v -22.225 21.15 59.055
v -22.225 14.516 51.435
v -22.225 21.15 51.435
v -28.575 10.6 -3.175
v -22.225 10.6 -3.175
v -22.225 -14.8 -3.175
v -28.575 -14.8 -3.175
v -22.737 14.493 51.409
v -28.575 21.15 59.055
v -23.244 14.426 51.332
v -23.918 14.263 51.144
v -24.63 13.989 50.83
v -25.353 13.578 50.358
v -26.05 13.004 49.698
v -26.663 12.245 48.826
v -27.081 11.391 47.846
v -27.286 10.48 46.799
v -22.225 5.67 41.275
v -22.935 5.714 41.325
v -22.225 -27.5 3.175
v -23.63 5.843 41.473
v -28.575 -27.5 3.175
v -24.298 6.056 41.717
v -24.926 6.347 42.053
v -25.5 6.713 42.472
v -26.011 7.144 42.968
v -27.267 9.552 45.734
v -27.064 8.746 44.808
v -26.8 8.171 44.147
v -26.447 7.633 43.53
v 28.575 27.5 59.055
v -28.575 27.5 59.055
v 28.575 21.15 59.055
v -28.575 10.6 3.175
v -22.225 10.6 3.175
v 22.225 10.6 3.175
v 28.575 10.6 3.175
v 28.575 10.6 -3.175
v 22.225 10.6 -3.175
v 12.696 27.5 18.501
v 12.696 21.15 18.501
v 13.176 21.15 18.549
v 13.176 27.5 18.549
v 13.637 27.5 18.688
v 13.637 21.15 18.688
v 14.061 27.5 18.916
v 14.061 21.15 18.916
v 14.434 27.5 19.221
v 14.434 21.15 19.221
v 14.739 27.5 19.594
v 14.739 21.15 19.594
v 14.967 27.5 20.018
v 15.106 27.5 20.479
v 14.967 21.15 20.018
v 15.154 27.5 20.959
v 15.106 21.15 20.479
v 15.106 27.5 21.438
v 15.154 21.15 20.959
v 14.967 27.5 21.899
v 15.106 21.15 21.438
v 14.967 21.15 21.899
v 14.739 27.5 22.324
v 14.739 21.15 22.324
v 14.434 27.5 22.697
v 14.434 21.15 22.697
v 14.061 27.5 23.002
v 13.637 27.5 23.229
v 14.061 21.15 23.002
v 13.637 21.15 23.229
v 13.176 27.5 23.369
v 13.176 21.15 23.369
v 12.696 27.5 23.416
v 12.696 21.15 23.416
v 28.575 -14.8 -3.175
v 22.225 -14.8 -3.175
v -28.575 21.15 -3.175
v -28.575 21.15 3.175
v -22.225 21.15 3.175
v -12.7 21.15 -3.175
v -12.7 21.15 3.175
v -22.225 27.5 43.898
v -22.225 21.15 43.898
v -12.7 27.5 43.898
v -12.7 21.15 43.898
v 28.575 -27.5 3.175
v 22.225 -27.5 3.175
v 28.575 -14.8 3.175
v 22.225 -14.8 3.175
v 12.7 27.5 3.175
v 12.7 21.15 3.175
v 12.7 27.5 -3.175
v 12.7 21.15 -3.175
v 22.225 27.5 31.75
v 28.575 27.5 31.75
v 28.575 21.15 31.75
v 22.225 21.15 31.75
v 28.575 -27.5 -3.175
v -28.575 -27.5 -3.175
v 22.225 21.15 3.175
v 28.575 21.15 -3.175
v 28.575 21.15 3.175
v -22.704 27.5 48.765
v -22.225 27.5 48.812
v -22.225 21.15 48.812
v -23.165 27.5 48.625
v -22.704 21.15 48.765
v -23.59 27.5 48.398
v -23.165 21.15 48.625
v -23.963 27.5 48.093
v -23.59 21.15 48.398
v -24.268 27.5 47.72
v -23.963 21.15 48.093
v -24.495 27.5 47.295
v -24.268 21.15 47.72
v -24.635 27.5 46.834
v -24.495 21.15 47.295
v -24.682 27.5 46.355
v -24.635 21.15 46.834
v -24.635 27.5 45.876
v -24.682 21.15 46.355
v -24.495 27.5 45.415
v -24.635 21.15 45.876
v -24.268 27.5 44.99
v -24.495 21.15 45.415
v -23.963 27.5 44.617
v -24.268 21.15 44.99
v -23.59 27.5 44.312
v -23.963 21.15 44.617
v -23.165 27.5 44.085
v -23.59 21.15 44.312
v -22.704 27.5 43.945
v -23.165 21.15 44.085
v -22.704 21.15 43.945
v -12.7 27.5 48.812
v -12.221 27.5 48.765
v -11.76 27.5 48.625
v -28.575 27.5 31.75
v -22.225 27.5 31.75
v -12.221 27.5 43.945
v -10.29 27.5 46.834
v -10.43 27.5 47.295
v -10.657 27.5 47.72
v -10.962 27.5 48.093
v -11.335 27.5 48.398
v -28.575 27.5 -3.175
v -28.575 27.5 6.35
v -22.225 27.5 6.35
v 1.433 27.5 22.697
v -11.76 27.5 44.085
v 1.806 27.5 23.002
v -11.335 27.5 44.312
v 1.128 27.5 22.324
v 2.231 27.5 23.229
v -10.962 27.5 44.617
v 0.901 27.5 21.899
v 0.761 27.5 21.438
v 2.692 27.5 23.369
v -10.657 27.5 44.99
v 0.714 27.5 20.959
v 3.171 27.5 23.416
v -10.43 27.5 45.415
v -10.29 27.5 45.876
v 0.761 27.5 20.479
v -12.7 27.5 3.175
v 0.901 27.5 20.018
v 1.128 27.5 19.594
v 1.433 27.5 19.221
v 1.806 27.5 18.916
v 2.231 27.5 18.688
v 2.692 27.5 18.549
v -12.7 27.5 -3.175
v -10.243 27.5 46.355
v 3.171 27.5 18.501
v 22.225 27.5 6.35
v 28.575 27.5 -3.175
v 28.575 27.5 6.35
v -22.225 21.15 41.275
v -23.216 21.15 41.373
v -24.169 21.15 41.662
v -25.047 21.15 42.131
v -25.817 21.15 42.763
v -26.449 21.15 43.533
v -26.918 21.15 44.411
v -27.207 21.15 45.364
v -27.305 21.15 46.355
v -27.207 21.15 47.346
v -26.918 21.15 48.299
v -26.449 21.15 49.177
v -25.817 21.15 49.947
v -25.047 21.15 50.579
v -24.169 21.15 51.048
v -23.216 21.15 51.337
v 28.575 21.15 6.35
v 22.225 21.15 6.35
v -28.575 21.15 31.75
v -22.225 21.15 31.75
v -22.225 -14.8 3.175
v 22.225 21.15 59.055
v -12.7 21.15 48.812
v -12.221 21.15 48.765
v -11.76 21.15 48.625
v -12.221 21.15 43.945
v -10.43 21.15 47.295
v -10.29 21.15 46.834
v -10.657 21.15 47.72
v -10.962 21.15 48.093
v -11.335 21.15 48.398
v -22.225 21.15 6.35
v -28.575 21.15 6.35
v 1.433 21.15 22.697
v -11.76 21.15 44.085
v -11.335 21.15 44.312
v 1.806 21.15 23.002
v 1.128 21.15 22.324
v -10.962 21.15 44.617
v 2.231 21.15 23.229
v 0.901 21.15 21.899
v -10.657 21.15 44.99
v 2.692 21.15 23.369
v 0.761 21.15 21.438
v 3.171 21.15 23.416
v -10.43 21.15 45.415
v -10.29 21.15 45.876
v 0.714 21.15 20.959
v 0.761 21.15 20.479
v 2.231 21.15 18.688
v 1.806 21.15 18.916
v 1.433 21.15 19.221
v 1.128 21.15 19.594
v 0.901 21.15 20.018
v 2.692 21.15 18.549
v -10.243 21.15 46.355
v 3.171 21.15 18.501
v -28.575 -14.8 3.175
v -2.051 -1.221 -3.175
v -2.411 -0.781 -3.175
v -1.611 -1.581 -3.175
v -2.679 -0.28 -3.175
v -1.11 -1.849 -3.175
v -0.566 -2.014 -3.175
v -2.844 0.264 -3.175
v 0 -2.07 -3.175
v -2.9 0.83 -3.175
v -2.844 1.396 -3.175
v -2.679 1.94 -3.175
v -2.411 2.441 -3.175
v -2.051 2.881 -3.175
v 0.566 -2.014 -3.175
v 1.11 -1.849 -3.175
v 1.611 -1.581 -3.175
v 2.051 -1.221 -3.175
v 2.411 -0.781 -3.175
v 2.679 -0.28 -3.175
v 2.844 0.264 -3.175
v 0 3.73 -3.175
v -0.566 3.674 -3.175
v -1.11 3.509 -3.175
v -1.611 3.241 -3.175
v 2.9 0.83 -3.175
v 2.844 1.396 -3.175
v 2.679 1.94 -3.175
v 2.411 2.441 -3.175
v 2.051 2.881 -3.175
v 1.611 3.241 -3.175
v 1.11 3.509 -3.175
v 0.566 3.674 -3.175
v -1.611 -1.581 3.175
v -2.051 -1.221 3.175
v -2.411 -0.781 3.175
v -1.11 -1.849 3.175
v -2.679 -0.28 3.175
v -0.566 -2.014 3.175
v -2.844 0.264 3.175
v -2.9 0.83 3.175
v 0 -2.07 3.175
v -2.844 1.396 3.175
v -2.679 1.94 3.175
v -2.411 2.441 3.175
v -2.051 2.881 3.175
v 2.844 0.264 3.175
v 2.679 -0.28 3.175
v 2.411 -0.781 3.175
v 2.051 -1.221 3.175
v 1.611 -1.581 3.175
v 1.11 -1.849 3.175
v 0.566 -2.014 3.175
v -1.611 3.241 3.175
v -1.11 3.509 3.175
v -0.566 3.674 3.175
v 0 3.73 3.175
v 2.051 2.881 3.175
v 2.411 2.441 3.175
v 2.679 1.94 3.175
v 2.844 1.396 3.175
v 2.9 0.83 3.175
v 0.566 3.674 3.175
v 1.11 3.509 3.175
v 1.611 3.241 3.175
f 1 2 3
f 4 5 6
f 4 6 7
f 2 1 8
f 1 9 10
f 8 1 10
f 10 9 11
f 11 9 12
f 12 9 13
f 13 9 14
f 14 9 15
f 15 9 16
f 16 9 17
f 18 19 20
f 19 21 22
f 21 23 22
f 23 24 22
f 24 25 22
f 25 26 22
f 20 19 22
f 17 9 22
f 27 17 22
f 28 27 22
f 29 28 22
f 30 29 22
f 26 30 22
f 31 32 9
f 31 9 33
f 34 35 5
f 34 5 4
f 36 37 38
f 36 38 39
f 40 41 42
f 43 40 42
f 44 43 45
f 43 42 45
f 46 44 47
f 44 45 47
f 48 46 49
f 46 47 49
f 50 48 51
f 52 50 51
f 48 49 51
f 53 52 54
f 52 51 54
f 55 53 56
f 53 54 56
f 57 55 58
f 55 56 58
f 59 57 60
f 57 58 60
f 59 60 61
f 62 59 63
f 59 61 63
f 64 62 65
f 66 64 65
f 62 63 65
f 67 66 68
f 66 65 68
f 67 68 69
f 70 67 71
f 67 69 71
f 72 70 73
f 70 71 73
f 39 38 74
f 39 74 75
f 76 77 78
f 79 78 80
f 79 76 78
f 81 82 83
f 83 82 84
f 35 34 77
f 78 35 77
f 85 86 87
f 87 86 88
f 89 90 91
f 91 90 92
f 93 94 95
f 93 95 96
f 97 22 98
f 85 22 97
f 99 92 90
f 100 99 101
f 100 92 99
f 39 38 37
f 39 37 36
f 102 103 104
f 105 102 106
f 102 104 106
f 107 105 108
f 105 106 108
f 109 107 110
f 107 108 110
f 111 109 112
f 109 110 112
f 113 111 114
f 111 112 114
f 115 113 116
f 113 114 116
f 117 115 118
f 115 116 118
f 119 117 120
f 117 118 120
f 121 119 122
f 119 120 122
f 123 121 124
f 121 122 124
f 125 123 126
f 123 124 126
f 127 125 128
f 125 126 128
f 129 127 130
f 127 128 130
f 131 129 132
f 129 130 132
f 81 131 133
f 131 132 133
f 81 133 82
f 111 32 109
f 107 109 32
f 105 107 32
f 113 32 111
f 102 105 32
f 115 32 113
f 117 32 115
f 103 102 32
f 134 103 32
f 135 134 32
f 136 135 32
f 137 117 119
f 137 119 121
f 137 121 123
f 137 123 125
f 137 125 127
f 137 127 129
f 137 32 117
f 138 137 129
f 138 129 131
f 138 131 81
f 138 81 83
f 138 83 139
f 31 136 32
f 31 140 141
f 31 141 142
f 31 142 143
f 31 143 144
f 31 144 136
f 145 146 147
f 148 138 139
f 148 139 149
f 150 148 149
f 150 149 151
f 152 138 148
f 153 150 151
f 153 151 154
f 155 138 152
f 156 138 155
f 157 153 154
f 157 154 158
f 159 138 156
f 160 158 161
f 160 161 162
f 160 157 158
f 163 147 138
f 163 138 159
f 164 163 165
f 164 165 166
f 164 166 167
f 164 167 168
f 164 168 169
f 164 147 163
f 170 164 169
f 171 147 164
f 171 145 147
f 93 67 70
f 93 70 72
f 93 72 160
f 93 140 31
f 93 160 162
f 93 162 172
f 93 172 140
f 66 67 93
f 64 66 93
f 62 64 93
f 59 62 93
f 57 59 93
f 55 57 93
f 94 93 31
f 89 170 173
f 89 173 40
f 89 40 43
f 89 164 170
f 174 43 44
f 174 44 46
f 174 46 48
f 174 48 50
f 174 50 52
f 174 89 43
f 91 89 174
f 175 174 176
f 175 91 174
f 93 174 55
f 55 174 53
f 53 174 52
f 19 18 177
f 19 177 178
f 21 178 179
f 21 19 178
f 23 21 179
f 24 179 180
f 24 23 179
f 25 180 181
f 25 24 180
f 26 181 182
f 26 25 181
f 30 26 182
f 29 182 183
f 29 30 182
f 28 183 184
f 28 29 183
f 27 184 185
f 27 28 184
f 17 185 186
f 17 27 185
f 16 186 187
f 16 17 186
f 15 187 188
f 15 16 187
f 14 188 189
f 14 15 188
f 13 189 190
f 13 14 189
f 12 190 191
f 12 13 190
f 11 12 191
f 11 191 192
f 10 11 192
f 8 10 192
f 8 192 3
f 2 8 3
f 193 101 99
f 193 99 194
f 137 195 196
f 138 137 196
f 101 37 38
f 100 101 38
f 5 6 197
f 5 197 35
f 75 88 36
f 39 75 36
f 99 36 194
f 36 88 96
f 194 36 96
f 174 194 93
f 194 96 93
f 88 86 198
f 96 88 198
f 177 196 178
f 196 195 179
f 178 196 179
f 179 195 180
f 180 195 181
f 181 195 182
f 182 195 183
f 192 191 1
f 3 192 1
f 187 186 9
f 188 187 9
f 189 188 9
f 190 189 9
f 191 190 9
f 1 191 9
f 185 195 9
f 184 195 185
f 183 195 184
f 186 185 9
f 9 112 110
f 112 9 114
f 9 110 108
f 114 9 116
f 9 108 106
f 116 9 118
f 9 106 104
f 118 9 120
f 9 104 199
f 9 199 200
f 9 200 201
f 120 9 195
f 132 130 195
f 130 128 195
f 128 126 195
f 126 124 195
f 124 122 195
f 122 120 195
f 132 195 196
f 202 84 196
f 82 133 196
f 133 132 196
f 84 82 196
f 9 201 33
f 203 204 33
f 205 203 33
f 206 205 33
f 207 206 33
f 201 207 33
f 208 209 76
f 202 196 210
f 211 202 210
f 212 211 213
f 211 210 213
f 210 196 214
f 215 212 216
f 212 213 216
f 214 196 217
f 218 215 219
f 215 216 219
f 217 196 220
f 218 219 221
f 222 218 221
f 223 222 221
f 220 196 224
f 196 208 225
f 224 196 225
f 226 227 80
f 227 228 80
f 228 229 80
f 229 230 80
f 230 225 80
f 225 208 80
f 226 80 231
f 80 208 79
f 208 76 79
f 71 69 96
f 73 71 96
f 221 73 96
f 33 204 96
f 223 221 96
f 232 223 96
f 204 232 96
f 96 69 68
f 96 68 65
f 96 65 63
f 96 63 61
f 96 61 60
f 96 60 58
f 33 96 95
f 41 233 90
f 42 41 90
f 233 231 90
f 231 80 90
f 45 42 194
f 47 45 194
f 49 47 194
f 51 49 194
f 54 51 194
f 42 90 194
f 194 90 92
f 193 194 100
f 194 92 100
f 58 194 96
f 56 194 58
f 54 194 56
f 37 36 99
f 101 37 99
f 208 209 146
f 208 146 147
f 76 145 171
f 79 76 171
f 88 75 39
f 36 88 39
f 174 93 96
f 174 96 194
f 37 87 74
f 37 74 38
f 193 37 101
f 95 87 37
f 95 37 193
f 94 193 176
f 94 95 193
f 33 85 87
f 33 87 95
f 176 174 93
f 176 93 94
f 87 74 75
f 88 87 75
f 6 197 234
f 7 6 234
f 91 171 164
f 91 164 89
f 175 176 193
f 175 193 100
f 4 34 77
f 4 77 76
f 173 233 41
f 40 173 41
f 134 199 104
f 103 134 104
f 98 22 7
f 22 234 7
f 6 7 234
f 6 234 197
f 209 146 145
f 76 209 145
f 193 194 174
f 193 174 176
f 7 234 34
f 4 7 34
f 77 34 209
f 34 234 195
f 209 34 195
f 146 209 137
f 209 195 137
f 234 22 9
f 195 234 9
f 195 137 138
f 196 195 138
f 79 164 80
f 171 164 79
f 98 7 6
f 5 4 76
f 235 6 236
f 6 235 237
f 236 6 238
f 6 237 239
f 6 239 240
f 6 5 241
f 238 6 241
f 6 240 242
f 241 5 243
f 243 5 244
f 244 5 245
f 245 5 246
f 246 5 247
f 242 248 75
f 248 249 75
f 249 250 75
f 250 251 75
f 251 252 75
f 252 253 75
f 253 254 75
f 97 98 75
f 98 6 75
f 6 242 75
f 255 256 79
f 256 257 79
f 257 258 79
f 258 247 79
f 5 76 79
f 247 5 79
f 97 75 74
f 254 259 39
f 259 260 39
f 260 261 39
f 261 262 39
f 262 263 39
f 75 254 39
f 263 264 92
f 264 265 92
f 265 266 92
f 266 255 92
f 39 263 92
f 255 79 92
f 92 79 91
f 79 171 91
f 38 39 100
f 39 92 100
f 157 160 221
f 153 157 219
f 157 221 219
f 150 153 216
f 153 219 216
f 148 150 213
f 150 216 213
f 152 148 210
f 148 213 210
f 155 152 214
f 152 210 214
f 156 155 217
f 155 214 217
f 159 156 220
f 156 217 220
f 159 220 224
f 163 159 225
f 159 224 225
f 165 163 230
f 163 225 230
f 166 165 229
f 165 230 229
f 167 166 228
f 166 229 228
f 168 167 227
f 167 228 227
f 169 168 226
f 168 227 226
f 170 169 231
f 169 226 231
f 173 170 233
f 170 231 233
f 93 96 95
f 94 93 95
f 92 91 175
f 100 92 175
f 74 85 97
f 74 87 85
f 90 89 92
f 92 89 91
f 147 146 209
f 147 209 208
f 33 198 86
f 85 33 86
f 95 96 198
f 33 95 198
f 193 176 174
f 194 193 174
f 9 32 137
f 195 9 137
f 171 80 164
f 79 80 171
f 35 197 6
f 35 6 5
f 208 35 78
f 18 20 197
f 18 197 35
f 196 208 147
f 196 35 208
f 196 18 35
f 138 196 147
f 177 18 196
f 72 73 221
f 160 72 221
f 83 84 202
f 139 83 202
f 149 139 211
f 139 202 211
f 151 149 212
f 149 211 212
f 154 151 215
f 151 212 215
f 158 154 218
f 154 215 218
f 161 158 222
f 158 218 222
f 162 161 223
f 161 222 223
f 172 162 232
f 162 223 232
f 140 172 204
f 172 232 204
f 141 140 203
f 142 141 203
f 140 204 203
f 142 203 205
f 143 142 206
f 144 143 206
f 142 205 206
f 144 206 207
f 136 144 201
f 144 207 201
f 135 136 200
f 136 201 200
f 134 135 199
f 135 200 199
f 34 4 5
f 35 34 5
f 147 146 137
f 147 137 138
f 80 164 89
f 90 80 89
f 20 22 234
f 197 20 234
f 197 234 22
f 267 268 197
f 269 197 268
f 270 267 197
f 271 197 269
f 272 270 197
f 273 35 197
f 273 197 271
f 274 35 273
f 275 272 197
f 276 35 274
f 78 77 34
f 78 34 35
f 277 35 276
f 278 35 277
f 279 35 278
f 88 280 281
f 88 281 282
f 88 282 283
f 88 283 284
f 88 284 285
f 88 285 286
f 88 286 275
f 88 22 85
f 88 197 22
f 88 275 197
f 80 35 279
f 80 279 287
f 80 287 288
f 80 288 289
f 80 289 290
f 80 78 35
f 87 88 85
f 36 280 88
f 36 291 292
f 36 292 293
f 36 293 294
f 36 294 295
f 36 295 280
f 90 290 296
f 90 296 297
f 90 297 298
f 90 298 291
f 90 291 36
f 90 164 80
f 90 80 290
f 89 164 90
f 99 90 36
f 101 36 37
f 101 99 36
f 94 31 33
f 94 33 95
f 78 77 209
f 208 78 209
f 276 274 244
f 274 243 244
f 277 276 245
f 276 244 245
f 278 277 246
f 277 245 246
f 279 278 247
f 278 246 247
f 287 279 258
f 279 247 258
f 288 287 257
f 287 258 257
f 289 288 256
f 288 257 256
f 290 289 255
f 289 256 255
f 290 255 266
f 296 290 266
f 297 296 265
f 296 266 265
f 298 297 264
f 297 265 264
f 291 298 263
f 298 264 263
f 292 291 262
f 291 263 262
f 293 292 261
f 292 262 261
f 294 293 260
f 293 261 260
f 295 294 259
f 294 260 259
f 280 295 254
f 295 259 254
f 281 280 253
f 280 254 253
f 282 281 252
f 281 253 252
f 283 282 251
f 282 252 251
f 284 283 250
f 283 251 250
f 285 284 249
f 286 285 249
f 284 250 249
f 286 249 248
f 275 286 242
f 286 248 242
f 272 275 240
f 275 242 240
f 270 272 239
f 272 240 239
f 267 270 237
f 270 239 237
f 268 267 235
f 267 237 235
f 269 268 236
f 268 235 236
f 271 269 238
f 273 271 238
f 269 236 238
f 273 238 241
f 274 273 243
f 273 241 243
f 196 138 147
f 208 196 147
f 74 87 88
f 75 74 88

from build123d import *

# Parameters (mm, degrees)
SKETCH1_W                 = 57.15
SKETCH1_H                 = 54.999999982
BOSS_EXTRUDE1_DEPTH       = 3.175
SKETCH2_W                 = 57.15
SKETCH2_H                 = 6.35
BOSS_EXTRUDE2_DEPTH       = 55.88
M5_CLEARANCE_HOLE1_D      = 5.8
M5_CLEARANCE_HOLE1_DEPTH  = 6.35
M5_CLEARANCE_HOLE1_TIP    = 1.742495795
BOSS_EXTRUDE3_DEPTH       = 6.35
BOSS_EXTRUDE4_START       = -57.15
BOSS_EXTRUDE4_DEPTH       = 6.35
F_8_CLEARANCE_HOLE1_D     = 4.9149
F_8_CLEARANCE_HOLE1_DEPTH = 6.35
F_8_CLEARANCE_HOLE1_TIP   = 1.476584928
CUT_EXTRUDE1_START        = -50
CUT_EXTRUDE1_DEPTH        = 50
SKETCH9_R                 = 5.08
CUT_EXTRUDE2_DEPTH        = 82.675248076
SPLIT2_START              = 3.175
SPLIT2_OUTLINE_W          = 6.35
SPLIT2_OUTLINE_H          = 50.149999991
SPLIT2_DEPTH              = 56.825
SPLIT2_START_2            = 22.225
SPLIT2_2_DEPTH            = 6.35
SPLIT2_START_3            = -28.575
SPLIT2_3_DEPTH            = 1.27
SPLIT2_START_4            = -27.305
SPLIT2_4_DEPTH            = 5.08
SPLIT2_START_5            = -27.499999991
SPLIT2_5_DEPTH            = 48.649999982
SKETCH10_W                = 25.4
SKETCH10_H                = 6.35
CUT_EXTRUDE4_DEPTH        = 86.609717019
SKETCH11_W                = 6.35
SKETCH11_H                = 25.4
CUT_EXTRUDE5_DEPTH        = 86.609717019
SKETCH12_W                = 25.4
SKETCH12_H                = 6.35
BOSS_EXTRUDE5_DEPTH       = 6.35
SKETCH13_W                = 6.35
SKETCH13_H                = 25.4
BOSS_EXTRUDE6_DEPTH       = 6.35
SKETCH14_W                = 6.35
SKETCH14_H                = 25.4
BOSS_EXTRUDE7_DEPTH       = 6.35
SKETCH15_W                = 6.35
SKETCH15_H                = 25.4
CUT_EXTRUDE6_DEPTH        = 74.792638688
SKETCH16_W                = 6.35
SKETCH16_H                = 25.4
BOSS_EXTRUDE8_DEPTH       = 6.35
SKETCH17_W                = 6.35
SKETCH17_H                = 25.4
BOSS_EXTRUDE9_DEPTH       = 6.35


with BuildPart() as part:
    # Sketch1 → Boss-Extrude1 (new, symmetric)
    with BuildSketch(Plane.XY):
        Rectangle(SKETCH1_W, SKETCH1_H)
    extrude(amount=BOSS_EXTRUDE1_DEPTH, both=True)

    # Sketch2 → Boss-Extrude2 (add)
    with BuildSketch(Plane.XY.offset(3.175)):
        with Locations((0, 24.324999991)):
            Rectangle(SKETCH2_W, SKETCH2_H)
    extrude(amount=BOSS_EXTRUDE2_DEPTH)

    # M5 Clearance Hole1
    with Locations(Plane.XY.offset(3.175)):
        with Locations((0, 0.829999991)):
            Hole(M5_CLEARANCE_HOLE1_D / 2, depth=M5_CLEARANCE_HOLE1_DEPTH)
            with Locations((0, 0, -(M5_CLEARANCE_HOLE1_DEPTH + M5_CLEARANCE_HOLE1_TIP / 2))):  # 118° drill point
                Cone(0, M5_CLEARANCE_HOLE1_D / 2, M5_CLEARANCE_HOLE1_TIP, mode=Mode.SUBTRACT)

    # Sketch8 → Boss-Extrude3 (add)
    with BuildSketch(Plane(origin=(28.575, 0, 0), x_dir=(0, 0, -1), z_dir=(1, 0, 0))):
        Polygon((-59.055, 21.149999991), (-3.175, -27.499999991), (-3.175, 21.149999991), align=None)
    extrude(amount=-BOSS_EXTRUDE3_DEPTH)

    # Sketch8<2> → Boss-Extrude4 (add)
    with BuildSketch(Plane(origin=(28.575, 0, 0), x_dir=(0, 0, -1), z_dir=(1, 0, 0)).offset(BOSS_EXTRUDE4_START)):
        Polygon((-59.055, 21.149999991), (-3.175, -27.499999991), (-3.175, 21.149999991), align=None)
    extrude(amount=BOSS_EXTRUDE4_DEPTH)

    # #8 Clearance Hole1
    with Locations(Plane(origin=(0, 27.499999991, 0), x_dir=(1, 0, 0), z_dir=(0, 1, 0))):
        with Locations((-22.225, -46.355), (3.17116431, -20.95883569)):
            Hole(F_8_CLEARANCE_HOLE1_D / 2, depth=F_8_CLEARANCE_HOLE1_DEPTH)
            with Locations((0, 0, -(F_8_CLEARANCE_HOLE1_DEPTH + F_8_CLEARANCE_HOLE1_TIP / 2))):  # 118° drill point
                Cone(0, F_8_CLEARANCE_HOLE1_D / 2, F_8_CLEARANCE_HOLE1_TIP, mode=Mode.SUBTRACT)

    # Sketch7 → Cut-Extrude1 (cut)
    with BuildSketch(Plane(origin=(0, 27.499999991, 0), x_dir=(1, 0, 0), z_dir=(0, 1, 0)).offset(CUT_EXTRUDE1_START)):
        with BuildLine():
            Line((-22.225, -43.89755), (-12.7, -43.89755))
            ThreePointArc((-12.7, -43.89755), (-10.24255, -46.355), (-12.7, -48.81245))
            Line((-12.7, -48.81245), (-22.225, -48.81245))
            ThreePointArc((-22.225, -48.81245), (-24.68245, -46.355), (-22.225, -43.89755))
        make_face()
        with BuildLine():
            Line((3.17116431, -18.50138569), (12.69616431, -18.50138569))
            ThreePointArc((12.69616431, -18.50138569), (15.15361431, -20.95883569), (12.69616431, -23.41628569))
            Line((12.69616431, -23.41628569), (3.17116431, -23.41628569))
            ThreePointArc((3.17116431, -23.41628569), (0.71371431, -20.95883569), (3.17116431, -18.50138569))
        make_face()
    extrude(amount=CUT_EXTRUDE1_DEPTH, mode=Mode.SUBTRACT)

    # Sketch9 → Cut-Extrude2 (cut, through all)
    with BuildSketch(Plane.XZ.offset(-21.149999991)):
        with Locations((-22.225, 46.355)):
            Circle(SKETCH9_R)
    extrude(amount=CUT_EXTRUDE2_DEPTH, mode=Mode.SUBTRACT)


with BuildPart() as body_2:
    # Split1: read off the stored shape, not the designer's step
    # Split1: the piece on the far side of the plane
    add(part.part)
    split(bisect_by=Plane(origin=(0, 21.149999991, 0), x_dir=(1, 0, 0), z_dir=(0, 1, 0)), keep=Keep.BOTTOM)

    # Split2: read off the stored shape, not the designer's step
    # Split2 outline → Split2 (cut)
    with BuildSketch(Plane.XY.offset(SPLIT2_START)):
        with Locations((-25.4, -3.925000005)):
            Rectangle(SPLIT2_OUTLINE_W, SPLIT2_OUTLINE_H)
        with Locations((25.4, -3.925000005)):
            Rectangle(SPLIT2_OUTLINE_W, SPLIT2_OUTLINE_H)
    extrude(amount=SPLIT2_DEPTH, mode=Mode.SUBTRACT)

    # Sketch12 → Boss-Extrude5 (add)
    with BuildSketch(Plane(origin=(0, 21.149999991, 0), x_dir=(1, 0, 0), z_dir=(0, 1, 0))):
        Rectangle(SKETCH12_W, SKETCH12_H)
    extrude(amount=BOSS_EXTRUDE5_DEPTH)

    # Sketch15 → Cut-Extrude6 (cut, through all)
    with BuildSketch(Plane(origin=(0, 0, -3.175), x_dir=(-1, 0, 0), z_dir=(0, 0, -1))):
        with Locations((-25.4, -2.099999991)):
            Rectangle(SKETCH15_W, SKETCH15_H)
    cut_extrude6 = extrude(amount=-CUT_EXTRUDE6_DEPTH, mode=Mode.SUBTRACT)

    # Mirror2: Cut-Extrude6 across plane
    add(cut_extrude6.mirror(Plane(origin=(0, 0, 0), x_dir=(0, 0, 1), z_dir=(1, 0, 0))), mode=Mode.SUBTRACT)


with BuildPart() as part_1:
    add(part.part)

    # Split1
    split(bisect_by=Plane(origin=(0, 21.149999991, 0), x_dir=(1, 0, 0), z_dir=(0, 1, 0)), keep=Keep.TOP)

    # Sketch10 → Cut-Extrude4 (cut, through all)
    with BuildSketch(Plane(origin=(0, 27.499999991, 0), x_dir=(1, 0, 0), z_dir=(0, 1, 0))):
        Rectangle(SKETCH10_W, SKETCH10_H)
    extrude(amount=-CUT_EXTRUDE4_DEPTH, mode=Mode.SUBTRACT)

    # Sketch11 → Cut-Extrude5 (cut, through all)
    with BuildSketch(Plane(origin=(0, 27.499999991, 0), x_dir=(1, 0, 0), z_dir=(0, 1, 0))):
        with Locations((-25.4, -19.05)):
            Rectangle(SKETCH11_W, SKETCH11_H)
    cut_extrude5 = extrude(amount=-CUT_EXTRUDE5_DEPTH, mode=Mode.SUBTRACT)

    # Mirror1: Cut-Extrude5 across plane
    add(cut_extrude5.mirror(Plane(origin=(0, 0, 0), x_dir=(0, 0, 1), z_dir=(1, 0, 0))), mode=Mode.SUBTRACT)


with BuildPart() as body_3:
    # Split2 2 outline → Split2 2 (new body)
    with BuildSketch(Plane.YZ.offset(SPLIT2_START_2)):
        Polygon((-27.499999991, 3.175), (21.149999991, 3.175), (21.149999991, 59.055), align=None)
    extrude(amount=SPLIT2_2_DEPTH)

    # Sketch14 → Boss-Extrude7 (add)
    with BuildSketch(Plane(origin=(0, 21.149999991, 0), x_dir=(1, 0, 0), z_dir=(0, 1, 0))):
        with Locations((25.4, -19.05)):
            Rectangle(SKETCH14_W, SKETCH14_H)
    extrude(amount=BOSS_EXTRUDE7_DEPTH)

    # Sketch16 → Boss-Extrude8 (add)
    with BuildSketch(Plane(origin=(0, 0, 3.175), x_dir=(-1, 0, 0), z_dir=(0, 0, -1))):
        with Locations((-25.4, -2.099999991)):
            Rectangle(SKETCH16_W, SKETCH16_H)
    extrude(amount=BOSS_EXTRUDE8_DEPTH)


with BuildPart() as body_4:
    # Split2 3 outline → Split2 3 (new body)
    with BuildSketch(Plane.YZ.offset(SPLIT2_START_3)):
        Polygon((-27.499999991, 3.175), (21.149999991, 3.175), (21.149999991, 59.055), align=None)
    extrude(amount=SPLIT2_3_DEPTH)

    # Split2 4 outline → Split2 4 (add)
    with BuildSketch(Plane.YZ.offset(SPLIT2_START_4)):
        Polygon((-27.499999991, 3.175), (21.149999991, 3.175), (21.149999991, 59.055), align=None)
    extrude(amount=SPLIT2_4_DEPTH)

    # Split2 5 outline → Split2 5 (cut)
    with BuildSketch(Plane(origin=(0, 0, 0), x_dir=(1, 0, 0), z_dir=(0, 1, 0)).offset(SPLIT2_START_5)):
        with BuildLine():
            Line((-22.225, -51.435), (-22.225, -41.275))
            ThreePointArc((-22.225, -41.275), (-27.305, -46.355), (-22.225, -51.435))
        make_face()
    extrude(amount=SPLIT2_5_DEPTH, mode=Mode.SUBTRACT)

    # Sketch13 → Boss-Extrude6 (add)
    with BuildSketch(Plane(origin=(0, 21.149999991, 0), x_dir=(1, 0, 0), z_dir=(0, 1, 0))):
        with Locations((-25.4, -19.05)):
            Rectangle(SKETCH13_W, SKETCH13_H)
    extrude(amount=BOSS_EXTRUDE6_DEPTH)

    # Sketch17 → Boss-Extrude9 (add)
    with BuildSketch(Plane(origin=(0, 0, 3.175), x_dir=(-1, 0, 0), z_dir=(0, 0, -1))):
        with Locations((25.4, -2.099999991)):
            Rectangle(SKETCH17_W, SKETCH17_H)
    extrude(amount=BOSS_EXTRUDE9_DEPTH)


solid = Compound([body_2.part, part_1.part, body_3.part, body_4.part])
